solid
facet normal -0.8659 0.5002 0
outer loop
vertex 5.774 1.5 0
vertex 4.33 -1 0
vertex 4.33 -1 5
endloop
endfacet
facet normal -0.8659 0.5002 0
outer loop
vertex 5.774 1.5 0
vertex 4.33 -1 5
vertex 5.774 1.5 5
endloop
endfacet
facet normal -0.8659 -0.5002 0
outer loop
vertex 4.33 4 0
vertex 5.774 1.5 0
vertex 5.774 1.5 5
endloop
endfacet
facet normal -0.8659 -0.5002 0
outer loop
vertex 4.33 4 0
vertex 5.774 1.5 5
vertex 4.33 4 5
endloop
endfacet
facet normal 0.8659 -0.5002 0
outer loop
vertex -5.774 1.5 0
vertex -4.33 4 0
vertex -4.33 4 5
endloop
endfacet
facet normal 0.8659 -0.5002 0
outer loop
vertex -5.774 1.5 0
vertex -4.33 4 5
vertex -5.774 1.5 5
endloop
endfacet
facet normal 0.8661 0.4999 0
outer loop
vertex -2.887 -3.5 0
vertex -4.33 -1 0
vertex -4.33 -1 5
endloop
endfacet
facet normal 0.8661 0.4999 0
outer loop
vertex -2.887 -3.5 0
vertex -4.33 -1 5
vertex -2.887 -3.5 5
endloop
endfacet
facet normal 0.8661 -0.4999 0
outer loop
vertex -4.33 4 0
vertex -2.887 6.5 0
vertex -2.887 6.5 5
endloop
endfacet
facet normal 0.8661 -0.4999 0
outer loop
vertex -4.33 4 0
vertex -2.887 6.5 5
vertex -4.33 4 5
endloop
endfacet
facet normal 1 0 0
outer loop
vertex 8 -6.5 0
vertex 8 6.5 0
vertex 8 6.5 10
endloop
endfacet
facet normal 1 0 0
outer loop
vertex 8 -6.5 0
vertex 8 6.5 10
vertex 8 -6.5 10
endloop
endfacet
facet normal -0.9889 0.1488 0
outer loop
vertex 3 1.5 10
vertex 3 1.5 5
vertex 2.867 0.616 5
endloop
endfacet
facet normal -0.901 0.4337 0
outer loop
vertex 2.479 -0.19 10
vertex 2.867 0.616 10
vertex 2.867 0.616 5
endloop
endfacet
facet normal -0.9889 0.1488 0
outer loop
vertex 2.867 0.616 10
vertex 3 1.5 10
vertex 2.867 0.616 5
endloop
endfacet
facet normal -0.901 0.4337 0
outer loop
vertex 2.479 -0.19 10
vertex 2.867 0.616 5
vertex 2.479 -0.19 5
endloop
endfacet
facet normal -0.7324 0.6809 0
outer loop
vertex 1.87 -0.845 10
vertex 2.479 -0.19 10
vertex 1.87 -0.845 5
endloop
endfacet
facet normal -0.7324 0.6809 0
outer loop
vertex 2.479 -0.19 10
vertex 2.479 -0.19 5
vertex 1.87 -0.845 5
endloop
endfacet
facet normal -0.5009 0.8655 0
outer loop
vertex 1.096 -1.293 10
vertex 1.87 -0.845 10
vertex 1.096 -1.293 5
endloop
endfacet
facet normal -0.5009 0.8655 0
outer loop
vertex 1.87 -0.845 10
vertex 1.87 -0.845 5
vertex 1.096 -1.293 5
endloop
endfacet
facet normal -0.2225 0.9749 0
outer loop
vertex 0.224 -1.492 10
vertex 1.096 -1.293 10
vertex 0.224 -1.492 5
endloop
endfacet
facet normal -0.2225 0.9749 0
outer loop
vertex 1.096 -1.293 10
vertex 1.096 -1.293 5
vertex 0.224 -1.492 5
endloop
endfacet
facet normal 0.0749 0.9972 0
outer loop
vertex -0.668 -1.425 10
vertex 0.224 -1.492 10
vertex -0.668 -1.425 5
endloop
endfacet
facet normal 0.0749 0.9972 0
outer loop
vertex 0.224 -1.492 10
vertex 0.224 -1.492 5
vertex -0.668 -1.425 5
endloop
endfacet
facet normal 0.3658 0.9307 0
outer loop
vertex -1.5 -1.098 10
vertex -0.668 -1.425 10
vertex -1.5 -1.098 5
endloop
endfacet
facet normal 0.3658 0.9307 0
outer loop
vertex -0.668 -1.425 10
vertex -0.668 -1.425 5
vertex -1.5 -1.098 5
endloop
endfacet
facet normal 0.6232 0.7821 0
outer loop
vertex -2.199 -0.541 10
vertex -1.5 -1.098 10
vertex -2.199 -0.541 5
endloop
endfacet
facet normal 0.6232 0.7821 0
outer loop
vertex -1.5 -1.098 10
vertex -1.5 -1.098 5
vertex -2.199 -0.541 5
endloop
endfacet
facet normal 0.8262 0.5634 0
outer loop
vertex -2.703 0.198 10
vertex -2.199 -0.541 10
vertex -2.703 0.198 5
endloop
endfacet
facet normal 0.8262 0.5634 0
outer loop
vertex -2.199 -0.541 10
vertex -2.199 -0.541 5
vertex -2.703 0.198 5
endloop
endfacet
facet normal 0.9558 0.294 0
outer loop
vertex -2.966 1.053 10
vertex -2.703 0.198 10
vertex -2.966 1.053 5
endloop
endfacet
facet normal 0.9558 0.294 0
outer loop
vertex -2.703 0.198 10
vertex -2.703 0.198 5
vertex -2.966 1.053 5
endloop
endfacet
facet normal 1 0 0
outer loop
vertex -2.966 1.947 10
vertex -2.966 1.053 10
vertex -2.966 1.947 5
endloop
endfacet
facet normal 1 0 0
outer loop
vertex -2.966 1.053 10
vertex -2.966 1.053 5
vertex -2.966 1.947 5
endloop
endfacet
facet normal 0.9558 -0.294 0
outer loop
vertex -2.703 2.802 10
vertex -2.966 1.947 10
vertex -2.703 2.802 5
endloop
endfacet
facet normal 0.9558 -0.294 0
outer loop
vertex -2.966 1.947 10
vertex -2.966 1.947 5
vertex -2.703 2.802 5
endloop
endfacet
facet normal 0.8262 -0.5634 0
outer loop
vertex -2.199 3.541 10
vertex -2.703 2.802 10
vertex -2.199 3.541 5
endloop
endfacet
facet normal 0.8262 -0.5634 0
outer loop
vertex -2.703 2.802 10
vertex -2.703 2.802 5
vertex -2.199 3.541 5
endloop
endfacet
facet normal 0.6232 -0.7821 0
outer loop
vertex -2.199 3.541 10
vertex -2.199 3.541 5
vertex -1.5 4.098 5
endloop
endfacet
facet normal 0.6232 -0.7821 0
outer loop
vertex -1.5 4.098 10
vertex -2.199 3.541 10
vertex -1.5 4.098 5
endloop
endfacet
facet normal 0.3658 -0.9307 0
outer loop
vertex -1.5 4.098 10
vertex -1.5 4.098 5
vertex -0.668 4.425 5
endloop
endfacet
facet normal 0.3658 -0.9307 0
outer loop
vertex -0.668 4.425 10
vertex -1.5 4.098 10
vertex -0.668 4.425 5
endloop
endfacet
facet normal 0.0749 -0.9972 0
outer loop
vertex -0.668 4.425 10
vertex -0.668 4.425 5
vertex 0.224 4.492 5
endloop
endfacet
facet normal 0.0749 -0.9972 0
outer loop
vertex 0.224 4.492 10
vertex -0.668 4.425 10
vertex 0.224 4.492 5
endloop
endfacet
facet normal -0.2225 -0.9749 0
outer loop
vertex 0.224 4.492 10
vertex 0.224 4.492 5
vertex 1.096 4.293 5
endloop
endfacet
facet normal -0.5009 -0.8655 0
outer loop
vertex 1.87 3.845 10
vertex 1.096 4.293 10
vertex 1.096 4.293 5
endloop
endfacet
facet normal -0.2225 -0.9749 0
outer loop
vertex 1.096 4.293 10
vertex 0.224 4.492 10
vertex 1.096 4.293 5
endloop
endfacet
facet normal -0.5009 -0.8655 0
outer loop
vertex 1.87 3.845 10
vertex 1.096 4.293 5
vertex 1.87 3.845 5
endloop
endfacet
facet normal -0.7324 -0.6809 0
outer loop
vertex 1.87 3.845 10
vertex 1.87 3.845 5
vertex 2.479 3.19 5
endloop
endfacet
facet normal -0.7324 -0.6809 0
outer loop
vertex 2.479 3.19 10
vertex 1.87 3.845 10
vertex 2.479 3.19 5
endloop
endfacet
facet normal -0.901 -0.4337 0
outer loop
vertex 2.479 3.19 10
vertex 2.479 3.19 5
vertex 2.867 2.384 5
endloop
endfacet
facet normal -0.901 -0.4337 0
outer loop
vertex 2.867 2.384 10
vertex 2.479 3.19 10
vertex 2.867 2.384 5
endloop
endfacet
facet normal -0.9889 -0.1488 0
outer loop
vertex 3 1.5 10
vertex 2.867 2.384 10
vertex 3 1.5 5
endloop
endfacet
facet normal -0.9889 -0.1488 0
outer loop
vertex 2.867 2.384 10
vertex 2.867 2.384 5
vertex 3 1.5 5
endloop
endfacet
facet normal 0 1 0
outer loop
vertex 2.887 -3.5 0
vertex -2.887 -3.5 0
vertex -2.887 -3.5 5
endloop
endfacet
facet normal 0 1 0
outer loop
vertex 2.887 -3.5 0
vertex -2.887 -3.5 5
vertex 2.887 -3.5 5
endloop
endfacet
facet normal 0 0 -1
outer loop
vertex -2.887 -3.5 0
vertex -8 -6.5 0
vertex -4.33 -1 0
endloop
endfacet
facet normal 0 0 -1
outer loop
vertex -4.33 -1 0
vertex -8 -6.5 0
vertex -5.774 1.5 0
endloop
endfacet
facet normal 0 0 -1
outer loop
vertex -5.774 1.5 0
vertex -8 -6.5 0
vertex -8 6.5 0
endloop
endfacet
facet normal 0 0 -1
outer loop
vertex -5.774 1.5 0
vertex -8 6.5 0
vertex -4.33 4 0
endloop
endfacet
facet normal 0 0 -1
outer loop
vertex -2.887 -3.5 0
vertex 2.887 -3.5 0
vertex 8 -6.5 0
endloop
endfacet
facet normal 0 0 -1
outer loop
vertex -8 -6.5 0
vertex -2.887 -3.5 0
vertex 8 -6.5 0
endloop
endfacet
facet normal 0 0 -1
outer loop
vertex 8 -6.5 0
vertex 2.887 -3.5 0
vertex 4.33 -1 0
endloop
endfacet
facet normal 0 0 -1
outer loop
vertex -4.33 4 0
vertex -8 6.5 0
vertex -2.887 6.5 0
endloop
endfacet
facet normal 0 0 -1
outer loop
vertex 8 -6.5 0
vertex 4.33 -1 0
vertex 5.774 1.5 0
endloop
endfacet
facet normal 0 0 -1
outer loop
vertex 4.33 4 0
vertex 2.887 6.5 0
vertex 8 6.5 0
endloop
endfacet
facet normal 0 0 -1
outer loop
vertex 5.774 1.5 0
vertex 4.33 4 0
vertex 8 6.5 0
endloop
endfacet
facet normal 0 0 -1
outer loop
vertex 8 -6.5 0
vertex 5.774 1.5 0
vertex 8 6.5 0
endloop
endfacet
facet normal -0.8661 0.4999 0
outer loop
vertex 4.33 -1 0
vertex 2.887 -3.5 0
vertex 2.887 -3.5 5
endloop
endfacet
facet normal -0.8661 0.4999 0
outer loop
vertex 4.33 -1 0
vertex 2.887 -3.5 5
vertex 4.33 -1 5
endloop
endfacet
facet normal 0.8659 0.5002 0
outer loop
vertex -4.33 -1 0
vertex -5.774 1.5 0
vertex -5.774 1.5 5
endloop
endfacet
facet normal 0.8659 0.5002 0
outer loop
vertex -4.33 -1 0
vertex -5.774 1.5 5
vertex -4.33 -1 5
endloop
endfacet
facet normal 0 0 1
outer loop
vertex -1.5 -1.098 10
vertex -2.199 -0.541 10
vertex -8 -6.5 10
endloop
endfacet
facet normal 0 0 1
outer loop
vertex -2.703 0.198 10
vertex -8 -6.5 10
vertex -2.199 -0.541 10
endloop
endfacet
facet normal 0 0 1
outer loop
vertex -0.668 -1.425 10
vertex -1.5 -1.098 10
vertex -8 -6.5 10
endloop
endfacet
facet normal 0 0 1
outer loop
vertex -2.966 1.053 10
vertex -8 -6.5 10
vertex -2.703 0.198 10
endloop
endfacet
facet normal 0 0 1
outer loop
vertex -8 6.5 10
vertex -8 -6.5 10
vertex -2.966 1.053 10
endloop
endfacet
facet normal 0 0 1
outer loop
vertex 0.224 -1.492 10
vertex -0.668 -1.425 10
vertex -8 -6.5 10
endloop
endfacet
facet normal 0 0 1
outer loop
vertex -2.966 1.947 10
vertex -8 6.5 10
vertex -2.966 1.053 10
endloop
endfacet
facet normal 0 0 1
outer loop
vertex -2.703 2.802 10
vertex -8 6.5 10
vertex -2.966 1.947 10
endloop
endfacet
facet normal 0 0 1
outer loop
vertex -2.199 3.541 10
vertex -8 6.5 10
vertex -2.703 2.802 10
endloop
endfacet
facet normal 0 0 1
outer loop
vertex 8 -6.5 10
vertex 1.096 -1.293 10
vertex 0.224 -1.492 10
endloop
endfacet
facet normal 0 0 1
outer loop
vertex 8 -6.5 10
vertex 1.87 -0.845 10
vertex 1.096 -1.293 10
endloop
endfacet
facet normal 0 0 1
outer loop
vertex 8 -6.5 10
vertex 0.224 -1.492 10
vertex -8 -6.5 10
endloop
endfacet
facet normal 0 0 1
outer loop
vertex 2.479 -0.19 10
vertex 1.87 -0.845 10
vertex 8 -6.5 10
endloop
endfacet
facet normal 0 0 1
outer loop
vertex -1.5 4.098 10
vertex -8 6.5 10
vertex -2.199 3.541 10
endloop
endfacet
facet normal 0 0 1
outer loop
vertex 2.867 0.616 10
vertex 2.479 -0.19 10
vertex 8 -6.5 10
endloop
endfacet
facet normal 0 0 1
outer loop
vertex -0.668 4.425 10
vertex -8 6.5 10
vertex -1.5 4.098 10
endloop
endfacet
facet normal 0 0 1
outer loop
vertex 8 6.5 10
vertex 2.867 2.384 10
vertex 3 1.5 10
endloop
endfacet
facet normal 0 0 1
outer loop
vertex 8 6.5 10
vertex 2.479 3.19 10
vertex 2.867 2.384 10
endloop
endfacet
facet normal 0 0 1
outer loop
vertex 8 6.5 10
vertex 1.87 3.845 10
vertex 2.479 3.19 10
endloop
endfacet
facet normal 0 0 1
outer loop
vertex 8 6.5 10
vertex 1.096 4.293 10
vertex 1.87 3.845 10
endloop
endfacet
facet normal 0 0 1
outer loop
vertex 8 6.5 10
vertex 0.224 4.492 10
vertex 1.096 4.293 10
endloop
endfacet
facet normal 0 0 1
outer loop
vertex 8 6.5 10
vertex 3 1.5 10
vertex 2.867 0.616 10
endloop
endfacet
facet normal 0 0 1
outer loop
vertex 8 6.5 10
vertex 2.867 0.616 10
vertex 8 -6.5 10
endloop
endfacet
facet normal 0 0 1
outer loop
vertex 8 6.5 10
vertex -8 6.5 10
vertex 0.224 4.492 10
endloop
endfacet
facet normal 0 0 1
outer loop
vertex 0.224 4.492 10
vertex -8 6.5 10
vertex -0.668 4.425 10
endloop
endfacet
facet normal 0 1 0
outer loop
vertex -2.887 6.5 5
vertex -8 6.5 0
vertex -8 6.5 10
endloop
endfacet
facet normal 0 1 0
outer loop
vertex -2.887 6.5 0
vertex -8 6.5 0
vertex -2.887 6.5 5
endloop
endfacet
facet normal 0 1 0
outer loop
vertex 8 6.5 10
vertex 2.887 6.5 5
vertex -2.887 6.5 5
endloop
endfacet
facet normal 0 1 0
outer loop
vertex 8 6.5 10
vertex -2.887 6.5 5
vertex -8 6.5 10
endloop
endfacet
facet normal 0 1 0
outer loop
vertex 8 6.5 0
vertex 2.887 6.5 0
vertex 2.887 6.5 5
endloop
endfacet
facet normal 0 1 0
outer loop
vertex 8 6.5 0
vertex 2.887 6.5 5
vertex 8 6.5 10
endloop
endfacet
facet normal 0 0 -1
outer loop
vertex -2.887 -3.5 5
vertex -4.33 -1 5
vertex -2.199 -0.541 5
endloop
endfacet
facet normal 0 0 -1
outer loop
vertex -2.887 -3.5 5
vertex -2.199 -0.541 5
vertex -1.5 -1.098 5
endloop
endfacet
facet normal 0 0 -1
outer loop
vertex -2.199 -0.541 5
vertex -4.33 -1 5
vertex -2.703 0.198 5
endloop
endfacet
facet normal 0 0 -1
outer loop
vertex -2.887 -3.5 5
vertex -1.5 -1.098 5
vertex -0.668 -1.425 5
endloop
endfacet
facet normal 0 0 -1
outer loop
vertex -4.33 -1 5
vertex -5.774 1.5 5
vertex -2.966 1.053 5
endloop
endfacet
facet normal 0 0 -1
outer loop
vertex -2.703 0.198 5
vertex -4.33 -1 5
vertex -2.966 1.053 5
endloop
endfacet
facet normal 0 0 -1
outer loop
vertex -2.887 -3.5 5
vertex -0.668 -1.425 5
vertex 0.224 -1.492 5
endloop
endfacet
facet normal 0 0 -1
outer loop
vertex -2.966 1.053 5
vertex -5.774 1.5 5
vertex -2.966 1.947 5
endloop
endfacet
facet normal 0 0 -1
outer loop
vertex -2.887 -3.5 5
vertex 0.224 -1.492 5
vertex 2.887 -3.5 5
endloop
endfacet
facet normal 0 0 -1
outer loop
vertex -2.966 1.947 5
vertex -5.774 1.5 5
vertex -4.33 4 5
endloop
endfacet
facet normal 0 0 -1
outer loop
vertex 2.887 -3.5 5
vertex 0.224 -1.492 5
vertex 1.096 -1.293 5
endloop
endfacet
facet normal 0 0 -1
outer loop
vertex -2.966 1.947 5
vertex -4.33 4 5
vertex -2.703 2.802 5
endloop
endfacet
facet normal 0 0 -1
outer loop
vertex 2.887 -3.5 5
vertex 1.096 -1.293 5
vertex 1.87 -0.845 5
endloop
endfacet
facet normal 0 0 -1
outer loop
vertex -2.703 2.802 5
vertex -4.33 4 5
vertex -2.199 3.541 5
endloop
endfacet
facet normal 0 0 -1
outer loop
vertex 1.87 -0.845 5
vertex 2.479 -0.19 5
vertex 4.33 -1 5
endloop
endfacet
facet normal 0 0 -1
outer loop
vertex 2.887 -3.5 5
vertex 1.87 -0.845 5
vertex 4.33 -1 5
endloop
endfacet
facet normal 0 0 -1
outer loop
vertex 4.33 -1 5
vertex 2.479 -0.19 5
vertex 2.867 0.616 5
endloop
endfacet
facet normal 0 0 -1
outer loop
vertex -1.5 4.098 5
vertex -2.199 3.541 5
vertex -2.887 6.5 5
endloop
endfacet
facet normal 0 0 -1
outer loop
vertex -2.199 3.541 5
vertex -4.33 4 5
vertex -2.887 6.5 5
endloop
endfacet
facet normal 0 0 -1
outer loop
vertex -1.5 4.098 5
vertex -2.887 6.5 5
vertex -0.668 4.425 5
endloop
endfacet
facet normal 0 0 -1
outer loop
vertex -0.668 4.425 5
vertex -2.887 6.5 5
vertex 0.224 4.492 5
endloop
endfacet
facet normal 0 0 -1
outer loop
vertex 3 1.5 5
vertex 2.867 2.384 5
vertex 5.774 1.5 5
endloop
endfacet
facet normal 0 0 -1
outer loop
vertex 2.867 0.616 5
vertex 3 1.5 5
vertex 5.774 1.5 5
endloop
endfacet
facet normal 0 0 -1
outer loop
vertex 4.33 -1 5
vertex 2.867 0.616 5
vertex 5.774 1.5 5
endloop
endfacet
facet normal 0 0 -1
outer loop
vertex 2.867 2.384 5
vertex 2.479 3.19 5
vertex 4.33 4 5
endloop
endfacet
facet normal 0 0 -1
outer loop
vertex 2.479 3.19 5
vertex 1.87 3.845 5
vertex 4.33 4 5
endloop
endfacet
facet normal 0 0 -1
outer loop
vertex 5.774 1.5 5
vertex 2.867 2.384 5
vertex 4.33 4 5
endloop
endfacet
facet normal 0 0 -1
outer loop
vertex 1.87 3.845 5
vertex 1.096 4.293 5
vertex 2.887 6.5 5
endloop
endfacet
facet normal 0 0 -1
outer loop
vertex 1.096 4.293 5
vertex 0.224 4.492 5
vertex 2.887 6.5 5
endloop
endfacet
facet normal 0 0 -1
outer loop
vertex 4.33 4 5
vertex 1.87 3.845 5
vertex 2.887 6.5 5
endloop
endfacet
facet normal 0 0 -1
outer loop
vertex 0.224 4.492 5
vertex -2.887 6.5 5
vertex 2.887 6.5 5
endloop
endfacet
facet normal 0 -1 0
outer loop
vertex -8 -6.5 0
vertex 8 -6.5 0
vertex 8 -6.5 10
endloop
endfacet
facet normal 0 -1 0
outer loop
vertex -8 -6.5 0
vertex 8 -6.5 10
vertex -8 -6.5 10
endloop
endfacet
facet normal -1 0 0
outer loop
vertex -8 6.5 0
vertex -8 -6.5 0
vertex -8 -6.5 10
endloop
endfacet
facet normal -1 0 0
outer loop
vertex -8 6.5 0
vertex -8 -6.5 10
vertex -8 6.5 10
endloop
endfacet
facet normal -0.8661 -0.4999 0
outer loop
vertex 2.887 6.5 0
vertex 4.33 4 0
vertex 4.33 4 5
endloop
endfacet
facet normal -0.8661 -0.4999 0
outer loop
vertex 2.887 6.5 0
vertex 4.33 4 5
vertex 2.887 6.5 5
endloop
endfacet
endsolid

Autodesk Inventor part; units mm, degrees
ref_plane "YZ Plane" through (0, 0, 0) normal (1, 0, 0) x (0, 1, 0)
ref_plane "XZ Plane" through (0, 0, 0) normal (0, 1, 0) x (-1, 0, 0)
ref_plane "XY Plane" through (0, 0, 0) normal (0, 0, 1) x (1, 0, 0)
sketch "Sketch1" plane through (0, 1.5, 0) normal (0, 0, 1) x (1, 0, 0)
  line L0 (8, 5) -> (8, -8)
  line L1 (8, -8) -> (-8, -8)
  line L2 (-8, -8) -> (-8, 5)
  line L3 (-8, 5) -> (8, 5)
  line L4 (-4.3301, 2.5) -> (-5.7735, 0)
  line L5 (-5.7735, 0) -> (-4.3301, -2.5)
  line L6 (-4.3301, -2.5) -> (-2.8868, -5)
  line L7 (-2.8868, -5) -> (0, -5)
  line L8 (0, -5) -> (2.8868, -5)
  line L9 (2.8868, -5) -> (4.3301, -2.5)
  line L10 (4.3301, -2.5) -> (5.7735, 0)
  line L11 (5.7735, 0) -> (4.3301, 2.5)
  line L12 (4.3301, 2.5) -> (2.8868, 5)
  line L13 (-2.8868, 5) -> (-4.3301, 2.5)
  point P0 (0, 0)
extrude "Extrusion1" add sketch "Sketch1" along normal blind 5 contours L0 L1 L2 L3 L13 L4 L5 L6 L7 L8 L9 L10 L11 L12
sketch "Sketch2" plane through (0, 1.5, 5) normal (0, 0, 1) x (1, 0, 0)
  line L0 (-8, 5) -> (-8, -8) projected
  line L1 (8, 5) -> (-8, 5) projected
  line L2 (8, -8) -> (8, 5) projected
  line L3 (-8, -8) -> (8, -8) projected
  circle A0 centre (0, 0) radius 3 projected
extrude "Extrusion2" add sketch "Sketch2" along normal blind 5
properties part number "2x 2x M6 Nut Holder" material "ABS Plastic"
